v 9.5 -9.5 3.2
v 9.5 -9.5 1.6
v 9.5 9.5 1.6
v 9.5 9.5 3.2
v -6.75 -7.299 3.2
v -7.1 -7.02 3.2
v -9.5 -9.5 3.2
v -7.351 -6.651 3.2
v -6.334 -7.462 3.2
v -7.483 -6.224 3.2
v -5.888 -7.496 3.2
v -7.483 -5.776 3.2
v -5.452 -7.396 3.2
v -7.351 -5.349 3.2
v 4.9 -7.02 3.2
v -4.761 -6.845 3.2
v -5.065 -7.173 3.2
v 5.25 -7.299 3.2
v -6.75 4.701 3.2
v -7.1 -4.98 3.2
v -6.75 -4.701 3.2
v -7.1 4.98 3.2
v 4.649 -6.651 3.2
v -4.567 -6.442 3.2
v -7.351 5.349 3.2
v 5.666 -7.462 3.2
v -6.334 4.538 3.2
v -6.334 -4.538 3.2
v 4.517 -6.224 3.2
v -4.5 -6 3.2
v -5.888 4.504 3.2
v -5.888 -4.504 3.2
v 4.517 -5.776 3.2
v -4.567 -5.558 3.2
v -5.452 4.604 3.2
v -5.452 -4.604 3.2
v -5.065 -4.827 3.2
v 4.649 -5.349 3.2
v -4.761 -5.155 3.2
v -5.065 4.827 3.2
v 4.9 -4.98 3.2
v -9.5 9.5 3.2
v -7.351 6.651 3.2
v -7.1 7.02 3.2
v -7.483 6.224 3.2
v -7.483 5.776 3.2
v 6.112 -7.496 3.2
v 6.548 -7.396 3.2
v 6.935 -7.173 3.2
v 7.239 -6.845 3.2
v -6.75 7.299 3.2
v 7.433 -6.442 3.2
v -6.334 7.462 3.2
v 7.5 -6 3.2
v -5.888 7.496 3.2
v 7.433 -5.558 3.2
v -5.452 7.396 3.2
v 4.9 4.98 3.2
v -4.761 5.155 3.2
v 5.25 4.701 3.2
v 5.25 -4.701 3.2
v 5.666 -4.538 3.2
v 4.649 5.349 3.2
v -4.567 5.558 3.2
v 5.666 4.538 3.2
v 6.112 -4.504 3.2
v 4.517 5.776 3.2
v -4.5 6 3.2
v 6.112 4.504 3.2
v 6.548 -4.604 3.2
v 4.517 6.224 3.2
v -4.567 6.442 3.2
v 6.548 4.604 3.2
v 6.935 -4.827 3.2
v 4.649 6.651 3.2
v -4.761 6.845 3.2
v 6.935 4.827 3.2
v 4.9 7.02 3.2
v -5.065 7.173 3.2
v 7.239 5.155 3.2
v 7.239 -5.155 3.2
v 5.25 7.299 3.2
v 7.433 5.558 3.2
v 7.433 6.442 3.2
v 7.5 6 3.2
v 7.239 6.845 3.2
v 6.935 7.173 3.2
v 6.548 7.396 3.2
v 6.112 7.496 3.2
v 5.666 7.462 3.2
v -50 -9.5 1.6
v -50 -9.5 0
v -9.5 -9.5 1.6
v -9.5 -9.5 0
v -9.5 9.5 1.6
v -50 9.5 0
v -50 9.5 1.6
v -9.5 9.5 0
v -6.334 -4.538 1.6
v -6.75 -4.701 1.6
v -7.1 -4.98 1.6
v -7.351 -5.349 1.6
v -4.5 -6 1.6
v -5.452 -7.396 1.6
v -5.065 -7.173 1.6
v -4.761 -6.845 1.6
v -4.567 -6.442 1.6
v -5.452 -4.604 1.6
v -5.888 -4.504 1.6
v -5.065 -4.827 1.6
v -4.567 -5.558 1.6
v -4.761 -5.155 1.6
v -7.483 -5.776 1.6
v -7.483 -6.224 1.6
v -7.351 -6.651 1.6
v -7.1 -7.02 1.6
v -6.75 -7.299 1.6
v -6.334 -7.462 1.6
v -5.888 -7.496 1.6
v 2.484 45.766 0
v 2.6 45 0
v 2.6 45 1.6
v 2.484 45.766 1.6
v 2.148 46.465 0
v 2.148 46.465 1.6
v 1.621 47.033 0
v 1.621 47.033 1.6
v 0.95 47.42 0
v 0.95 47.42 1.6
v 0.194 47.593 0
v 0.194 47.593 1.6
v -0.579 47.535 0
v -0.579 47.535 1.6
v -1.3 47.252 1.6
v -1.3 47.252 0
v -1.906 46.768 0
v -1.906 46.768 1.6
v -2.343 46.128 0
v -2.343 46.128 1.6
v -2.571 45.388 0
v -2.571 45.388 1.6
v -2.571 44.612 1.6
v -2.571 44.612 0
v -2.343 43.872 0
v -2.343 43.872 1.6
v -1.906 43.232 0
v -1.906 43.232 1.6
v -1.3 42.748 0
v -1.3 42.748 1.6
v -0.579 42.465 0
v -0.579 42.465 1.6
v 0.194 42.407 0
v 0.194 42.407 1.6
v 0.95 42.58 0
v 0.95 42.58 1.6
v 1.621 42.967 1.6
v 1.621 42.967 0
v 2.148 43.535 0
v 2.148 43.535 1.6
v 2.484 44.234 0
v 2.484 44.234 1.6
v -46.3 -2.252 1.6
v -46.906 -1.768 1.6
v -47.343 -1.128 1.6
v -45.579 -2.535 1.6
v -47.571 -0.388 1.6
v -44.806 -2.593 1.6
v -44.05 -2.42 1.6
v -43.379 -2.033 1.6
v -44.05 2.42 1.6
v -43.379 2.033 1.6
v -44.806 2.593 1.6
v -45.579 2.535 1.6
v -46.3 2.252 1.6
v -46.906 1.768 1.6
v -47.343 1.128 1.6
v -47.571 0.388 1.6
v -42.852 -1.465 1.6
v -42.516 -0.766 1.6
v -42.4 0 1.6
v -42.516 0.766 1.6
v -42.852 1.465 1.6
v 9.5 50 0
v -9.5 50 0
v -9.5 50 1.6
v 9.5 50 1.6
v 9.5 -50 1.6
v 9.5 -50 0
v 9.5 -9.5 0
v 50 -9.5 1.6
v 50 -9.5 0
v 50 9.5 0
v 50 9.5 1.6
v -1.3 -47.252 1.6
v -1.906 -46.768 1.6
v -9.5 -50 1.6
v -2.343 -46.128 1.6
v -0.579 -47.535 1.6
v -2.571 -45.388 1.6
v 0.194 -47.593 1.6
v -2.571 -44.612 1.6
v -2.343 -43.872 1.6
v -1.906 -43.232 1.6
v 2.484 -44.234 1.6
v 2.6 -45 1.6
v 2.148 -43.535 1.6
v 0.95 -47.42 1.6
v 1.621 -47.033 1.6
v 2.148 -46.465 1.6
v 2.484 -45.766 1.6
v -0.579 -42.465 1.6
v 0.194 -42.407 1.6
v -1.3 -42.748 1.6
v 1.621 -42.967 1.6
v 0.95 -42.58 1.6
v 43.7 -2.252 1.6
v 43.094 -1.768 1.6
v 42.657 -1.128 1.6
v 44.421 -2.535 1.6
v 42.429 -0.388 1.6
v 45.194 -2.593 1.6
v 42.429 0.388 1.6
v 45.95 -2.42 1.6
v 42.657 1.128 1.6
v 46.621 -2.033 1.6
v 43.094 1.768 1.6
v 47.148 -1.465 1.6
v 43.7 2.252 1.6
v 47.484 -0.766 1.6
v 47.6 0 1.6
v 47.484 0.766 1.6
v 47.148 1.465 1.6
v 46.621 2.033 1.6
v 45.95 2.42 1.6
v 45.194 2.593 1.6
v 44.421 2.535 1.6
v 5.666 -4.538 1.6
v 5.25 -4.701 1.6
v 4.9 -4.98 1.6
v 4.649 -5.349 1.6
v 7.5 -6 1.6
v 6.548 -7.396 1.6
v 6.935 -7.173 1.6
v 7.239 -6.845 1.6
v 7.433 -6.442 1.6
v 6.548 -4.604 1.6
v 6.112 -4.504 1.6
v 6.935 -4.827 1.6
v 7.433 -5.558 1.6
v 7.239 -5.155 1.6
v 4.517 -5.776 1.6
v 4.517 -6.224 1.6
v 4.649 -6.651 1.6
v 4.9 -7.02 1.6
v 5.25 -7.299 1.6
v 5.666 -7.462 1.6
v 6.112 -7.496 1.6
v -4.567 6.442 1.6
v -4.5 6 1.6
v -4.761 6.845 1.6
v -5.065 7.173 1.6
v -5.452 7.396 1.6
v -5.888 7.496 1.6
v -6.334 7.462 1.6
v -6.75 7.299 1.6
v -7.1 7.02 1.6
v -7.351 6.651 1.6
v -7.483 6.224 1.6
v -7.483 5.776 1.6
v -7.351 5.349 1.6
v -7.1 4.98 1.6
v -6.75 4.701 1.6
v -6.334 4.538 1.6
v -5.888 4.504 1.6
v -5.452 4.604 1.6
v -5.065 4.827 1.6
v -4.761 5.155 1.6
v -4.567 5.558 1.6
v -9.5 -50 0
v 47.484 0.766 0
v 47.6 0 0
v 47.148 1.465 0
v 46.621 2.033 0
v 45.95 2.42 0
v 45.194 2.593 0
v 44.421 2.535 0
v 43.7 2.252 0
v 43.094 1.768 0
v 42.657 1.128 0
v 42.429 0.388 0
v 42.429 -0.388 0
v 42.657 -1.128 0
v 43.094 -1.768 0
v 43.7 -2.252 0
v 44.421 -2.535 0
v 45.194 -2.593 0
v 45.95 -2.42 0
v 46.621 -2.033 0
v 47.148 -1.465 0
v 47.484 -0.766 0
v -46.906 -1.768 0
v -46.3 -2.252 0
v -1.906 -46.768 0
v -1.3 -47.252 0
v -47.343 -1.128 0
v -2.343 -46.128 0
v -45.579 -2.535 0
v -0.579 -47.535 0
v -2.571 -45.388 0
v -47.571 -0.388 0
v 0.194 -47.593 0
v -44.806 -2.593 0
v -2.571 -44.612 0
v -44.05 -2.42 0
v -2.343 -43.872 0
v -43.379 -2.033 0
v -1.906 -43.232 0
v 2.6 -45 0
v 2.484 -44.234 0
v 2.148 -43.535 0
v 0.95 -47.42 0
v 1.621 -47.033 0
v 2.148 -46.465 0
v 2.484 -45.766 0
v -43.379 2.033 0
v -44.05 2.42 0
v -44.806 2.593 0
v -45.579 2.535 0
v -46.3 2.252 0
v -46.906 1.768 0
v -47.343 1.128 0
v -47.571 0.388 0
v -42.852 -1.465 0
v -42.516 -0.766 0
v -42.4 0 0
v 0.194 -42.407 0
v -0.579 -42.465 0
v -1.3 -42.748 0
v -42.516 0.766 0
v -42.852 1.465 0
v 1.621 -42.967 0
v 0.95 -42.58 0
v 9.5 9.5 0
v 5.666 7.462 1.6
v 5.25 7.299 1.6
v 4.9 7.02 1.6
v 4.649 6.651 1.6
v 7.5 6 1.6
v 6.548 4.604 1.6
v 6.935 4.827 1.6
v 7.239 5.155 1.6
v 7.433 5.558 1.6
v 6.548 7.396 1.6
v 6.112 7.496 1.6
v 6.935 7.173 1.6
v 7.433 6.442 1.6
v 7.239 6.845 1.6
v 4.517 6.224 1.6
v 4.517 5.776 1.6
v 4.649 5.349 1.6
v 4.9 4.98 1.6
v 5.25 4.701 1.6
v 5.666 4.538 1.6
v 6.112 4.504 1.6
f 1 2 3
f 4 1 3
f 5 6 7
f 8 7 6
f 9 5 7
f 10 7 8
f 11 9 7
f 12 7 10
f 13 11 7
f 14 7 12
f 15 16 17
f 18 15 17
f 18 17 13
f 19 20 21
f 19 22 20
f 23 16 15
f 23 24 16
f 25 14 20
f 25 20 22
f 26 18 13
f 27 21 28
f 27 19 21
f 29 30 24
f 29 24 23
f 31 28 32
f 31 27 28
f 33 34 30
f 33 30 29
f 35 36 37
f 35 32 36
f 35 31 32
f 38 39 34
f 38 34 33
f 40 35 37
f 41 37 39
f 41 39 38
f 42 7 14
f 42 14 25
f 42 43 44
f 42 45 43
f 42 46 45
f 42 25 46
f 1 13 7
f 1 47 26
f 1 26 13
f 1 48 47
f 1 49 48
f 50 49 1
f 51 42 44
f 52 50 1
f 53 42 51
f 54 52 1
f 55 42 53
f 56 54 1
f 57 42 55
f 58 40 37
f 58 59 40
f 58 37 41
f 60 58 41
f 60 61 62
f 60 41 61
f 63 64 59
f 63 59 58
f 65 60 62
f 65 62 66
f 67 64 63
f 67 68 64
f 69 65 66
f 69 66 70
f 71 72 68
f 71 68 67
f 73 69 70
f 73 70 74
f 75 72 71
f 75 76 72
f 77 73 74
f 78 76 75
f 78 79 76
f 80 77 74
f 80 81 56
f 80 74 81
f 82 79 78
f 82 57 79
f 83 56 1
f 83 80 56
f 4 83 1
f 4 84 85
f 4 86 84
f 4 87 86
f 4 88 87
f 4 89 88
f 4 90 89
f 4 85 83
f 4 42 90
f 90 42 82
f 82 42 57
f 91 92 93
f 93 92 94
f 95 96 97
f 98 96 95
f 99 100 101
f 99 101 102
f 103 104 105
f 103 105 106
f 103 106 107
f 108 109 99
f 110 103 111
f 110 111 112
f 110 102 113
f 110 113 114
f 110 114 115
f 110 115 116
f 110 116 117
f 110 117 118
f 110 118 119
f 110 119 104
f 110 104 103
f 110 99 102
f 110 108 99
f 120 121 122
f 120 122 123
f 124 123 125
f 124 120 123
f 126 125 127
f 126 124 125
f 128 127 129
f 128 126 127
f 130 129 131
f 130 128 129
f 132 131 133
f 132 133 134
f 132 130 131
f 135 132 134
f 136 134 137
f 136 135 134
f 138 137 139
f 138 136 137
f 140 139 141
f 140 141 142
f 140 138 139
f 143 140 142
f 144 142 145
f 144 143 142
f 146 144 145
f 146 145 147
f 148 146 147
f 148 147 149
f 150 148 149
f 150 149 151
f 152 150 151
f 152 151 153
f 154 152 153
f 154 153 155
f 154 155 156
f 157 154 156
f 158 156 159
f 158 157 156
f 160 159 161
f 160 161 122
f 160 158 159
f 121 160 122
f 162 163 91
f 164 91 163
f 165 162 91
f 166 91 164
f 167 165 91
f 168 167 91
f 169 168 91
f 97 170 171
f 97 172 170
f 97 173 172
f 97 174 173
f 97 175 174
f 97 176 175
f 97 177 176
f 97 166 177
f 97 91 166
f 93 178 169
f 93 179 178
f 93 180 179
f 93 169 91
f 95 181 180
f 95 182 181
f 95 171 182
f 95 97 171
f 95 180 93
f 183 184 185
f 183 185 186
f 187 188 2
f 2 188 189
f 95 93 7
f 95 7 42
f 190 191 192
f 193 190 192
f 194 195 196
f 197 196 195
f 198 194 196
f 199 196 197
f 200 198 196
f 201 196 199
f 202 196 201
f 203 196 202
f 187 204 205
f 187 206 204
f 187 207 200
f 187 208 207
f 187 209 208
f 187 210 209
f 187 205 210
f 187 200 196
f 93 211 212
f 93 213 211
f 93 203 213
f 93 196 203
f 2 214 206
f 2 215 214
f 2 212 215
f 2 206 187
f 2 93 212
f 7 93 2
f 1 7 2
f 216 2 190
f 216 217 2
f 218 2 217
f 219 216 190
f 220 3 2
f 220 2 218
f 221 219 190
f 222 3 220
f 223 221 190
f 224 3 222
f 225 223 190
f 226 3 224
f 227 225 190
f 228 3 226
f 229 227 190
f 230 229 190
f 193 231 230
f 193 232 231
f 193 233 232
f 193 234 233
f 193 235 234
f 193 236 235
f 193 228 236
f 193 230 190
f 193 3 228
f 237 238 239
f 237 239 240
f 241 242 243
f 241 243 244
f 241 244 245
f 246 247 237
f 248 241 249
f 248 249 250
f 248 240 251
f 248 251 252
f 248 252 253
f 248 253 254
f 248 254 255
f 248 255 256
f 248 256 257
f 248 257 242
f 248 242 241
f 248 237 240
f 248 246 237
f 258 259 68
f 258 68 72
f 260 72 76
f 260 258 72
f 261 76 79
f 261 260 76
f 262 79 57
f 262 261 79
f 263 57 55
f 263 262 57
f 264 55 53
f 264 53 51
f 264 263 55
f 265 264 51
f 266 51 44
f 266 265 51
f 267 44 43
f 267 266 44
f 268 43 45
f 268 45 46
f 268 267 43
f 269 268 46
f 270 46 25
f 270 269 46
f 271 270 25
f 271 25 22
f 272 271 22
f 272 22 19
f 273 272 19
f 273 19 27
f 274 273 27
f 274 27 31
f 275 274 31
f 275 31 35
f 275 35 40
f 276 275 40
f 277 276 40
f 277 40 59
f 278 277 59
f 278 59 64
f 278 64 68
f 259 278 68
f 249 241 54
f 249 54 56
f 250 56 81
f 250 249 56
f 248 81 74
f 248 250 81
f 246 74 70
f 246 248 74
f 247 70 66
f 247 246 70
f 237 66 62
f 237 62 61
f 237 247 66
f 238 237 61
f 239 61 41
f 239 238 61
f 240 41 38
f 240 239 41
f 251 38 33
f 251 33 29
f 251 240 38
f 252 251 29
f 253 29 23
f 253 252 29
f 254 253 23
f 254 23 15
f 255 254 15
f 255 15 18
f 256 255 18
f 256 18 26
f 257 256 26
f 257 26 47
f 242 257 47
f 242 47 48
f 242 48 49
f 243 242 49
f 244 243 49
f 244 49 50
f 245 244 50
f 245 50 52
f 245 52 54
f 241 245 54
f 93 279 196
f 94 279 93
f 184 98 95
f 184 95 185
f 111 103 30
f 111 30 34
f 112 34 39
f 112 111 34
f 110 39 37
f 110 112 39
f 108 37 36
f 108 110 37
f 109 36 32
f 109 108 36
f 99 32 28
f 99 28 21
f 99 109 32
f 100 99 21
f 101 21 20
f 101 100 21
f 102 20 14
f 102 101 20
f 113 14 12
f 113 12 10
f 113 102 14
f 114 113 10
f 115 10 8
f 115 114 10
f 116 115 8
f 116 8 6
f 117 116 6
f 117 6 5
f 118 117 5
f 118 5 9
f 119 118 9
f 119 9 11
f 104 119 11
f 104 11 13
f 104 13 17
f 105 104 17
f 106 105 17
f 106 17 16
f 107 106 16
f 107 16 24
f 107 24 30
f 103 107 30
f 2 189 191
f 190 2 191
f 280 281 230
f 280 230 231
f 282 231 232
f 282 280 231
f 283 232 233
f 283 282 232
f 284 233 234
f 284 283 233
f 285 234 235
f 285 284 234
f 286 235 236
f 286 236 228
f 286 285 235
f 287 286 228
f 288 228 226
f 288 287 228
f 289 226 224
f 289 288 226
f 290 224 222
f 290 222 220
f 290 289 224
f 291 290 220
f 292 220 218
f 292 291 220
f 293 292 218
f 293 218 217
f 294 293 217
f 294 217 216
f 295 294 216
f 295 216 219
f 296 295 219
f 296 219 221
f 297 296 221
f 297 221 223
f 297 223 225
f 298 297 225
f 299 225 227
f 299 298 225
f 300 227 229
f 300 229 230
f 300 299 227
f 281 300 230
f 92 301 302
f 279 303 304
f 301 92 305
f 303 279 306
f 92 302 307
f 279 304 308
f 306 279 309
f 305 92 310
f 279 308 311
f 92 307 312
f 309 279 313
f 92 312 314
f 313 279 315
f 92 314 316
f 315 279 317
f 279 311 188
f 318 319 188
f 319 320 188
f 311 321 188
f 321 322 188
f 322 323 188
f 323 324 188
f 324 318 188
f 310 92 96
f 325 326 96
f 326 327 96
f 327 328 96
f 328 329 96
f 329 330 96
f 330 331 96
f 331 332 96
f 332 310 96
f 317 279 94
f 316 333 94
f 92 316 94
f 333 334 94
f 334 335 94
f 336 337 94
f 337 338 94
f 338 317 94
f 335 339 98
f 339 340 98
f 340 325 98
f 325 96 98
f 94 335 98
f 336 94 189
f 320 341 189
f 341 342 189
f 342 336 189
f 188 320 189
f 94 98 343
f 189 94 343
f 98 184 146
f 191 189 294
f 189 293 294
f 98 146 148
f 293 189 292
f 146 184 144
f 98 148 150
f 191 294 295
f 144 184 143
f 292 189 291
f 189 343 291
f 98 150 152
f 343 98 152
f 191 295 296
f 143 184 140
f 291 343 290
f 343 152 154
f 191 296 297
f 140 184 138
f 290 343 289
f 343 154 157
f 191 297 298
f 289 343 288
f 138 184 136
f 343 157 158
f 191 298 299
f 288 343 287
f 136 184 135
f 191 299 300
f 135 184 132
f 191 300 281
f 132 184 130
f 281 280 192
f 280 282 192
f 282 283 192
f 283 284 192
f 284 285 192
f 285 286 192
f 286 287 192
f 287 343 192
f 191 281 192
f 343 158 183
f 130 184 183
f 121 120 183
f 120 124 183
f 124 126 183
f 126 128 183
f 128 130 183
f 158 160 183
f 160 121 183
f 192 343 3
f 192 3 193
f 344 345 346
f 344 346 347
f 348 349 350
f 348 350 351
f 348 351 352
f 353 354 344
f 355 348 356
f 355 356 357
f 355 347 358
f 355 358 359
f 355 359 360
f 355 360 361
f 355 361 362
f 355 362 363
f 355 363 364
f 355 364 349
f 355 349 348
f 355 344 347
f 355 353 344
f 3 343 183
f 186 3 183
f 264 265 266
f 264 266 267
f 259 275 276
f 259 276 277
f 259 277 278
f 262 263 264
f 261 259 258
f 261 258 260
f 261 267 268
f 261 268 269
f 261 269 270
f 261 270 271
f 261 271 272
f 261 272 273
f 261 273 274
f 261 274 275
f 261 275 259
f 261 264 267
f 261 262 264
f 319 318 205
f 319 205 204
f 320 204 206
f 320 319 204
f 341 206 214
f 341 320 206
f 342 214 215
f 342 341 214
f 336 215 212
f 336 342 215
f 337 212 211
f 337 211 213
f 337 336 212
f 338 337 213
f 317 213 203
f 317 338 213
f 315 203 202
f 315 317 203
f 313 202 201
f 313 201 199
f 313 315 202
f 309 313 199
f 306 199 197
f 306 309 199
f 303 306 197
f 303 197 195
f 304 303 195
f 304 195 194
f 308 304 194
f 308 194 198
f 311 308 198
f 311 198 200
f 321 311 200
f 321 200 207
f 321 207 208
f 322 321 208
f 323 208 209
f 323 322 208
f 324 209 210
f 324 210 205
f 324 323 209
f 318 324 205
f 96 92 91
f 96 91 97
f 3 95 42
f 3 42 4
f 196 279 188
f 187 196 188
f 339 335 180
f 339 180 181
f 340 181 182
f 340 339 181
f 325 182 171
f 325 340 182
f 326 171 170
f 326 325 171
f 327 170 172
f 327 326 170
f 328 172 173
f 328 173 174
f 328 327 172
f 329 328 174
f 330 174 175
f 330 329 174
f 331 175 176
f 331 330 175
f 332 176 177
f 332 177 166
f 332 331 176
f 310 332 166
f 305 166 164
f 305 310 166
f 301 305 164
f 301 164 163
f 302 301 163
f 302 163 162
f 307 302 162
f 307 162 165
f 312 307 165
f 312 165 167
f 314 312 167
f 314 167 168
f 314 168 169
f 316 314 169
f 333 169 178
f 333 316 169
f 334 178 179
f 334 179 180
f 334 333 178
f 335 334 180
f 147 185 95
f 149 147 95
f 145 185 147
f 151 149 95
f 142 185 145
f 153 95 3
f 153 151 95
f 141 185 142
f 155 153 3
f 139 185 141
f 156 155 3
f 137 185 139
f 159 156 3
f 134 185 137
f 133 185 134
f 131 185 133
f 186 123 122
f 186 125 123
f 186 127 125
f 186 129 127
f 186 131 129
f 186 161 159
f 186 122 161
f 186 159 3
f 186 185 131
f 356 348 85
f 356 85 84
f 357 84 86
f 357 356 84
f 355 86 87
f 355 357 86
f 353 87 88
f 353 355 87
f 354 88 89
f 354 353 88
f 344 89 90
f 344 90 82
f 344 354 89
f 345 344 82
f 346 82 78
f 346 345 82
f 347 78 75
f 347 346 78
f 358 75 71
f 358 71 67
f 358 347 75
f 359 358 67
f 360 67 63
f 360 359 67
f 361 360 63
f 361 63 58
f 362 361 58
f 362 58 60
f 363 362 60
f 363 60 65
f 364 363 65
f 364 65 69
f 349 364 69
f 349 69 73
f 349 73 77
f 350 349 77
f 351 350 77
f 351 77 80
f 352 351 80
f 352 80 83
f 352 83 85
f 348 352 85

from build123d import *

# Parameters (mm, degrees)
F0_W     = 40.5
F0_H     = 19
F0_R     = 2.6
F1_DEPTH = 1.6
F0_W_2   = 19
F0_H_2   = 40.5
F0_R_2   = 1.5
F2_DEPTH = 3.2
F3_DEPTH = 1.6


with BuildPart() as f1:
    # F0 (on Top) → F1 (new body)
    with BuildSketch(Plane.XY):
        with Locations((-29.75, 0)):
            Rectangle(F0_W, F0_H)
        with Locations((-45, 0)):
            Circle(F0_R, mode=Mode.SUBTRACT)
    extrude(amount=F1_DEPTH)



with BuildPart() as f1b:
    # F0 (on Top) → F1, piece 2 (new body)
    with BuildSketch(Plane.XY):
        with Locations((0, 29.75)):
            Rectangle(F0_W_2, F0_H_2)
        with Locations((0, 45)):
            Circle(F0_R, mode=Mode.SUBTRACT)
    extrude(amount=F1_DEPTH)


with BuildPart() as f1c:
    # F0 (on Top) → F1, piece 3 (new body)
    with BuildSketch(Plane.XY):
        with Locations((29.75, 0)):
            Rectangle(F0_W, F0_H)
        with Locations((45, 0)):
            Circle(F0_R, mode=Mode.SUBTRACT)
    extrude(amount=F1_DEPTH)


with BuildPart() as f1d:
    # F0 (on Top) → F1, piece 4 (new body)
    with BuildSketch(Plane.XY):
        with Locations((0, -29.75)):
            Rectangle(F0_W_2, F0_H_2)
        with Locations((0, -45)):
            Circle(F0_R, mode=Mode.SUBTRACT)
    extrude(amount=F1_DEPTH)


with BuildPart() as f1_1:
    add(f1.part)

    add(f1b.part)  # F2 merges F1b

    add(f1c.part)  # F2 merges F1c

    add(f1d.part)  # F2 merges F1d
    # F0 (on Top) → F2 (join)
    with BuildSketch(Plane.XY):
        Rectangle(F0_W_2, F0_H)
        with Locations((-6, -6)):
            Circle(F0_R_2, mode=Mode.SUBTRACT)
        with Locations((6, -6)):
            Circle(F0_R_2, mode=Mode.SUBTRACT)
        with Locations((-6, 6)):
            Circle(F0_R_2, mode=Mode.SUBTRACT)
        with Locations((6, 6)):
            Circle(F0_R_2, mode=Mode.SUBTRACT)
    extrude(amount=F2_DEPTH)

    # F0 (on Top) → F3 (join)
    with BuildSketch(Plane.XY):
        with Locations((6, -6)):
            Circle(F0_R_2)
        with Locations((6, 6)):
            Circle(F0_R_2)
        with Locations((-6, 6)):
            Circle(F0_R_2)
        with Locations((-6, -6)):
            Circle(F0_R_2)
    extrude(amount=F3_DEPTH)


solid = f1_1.part
